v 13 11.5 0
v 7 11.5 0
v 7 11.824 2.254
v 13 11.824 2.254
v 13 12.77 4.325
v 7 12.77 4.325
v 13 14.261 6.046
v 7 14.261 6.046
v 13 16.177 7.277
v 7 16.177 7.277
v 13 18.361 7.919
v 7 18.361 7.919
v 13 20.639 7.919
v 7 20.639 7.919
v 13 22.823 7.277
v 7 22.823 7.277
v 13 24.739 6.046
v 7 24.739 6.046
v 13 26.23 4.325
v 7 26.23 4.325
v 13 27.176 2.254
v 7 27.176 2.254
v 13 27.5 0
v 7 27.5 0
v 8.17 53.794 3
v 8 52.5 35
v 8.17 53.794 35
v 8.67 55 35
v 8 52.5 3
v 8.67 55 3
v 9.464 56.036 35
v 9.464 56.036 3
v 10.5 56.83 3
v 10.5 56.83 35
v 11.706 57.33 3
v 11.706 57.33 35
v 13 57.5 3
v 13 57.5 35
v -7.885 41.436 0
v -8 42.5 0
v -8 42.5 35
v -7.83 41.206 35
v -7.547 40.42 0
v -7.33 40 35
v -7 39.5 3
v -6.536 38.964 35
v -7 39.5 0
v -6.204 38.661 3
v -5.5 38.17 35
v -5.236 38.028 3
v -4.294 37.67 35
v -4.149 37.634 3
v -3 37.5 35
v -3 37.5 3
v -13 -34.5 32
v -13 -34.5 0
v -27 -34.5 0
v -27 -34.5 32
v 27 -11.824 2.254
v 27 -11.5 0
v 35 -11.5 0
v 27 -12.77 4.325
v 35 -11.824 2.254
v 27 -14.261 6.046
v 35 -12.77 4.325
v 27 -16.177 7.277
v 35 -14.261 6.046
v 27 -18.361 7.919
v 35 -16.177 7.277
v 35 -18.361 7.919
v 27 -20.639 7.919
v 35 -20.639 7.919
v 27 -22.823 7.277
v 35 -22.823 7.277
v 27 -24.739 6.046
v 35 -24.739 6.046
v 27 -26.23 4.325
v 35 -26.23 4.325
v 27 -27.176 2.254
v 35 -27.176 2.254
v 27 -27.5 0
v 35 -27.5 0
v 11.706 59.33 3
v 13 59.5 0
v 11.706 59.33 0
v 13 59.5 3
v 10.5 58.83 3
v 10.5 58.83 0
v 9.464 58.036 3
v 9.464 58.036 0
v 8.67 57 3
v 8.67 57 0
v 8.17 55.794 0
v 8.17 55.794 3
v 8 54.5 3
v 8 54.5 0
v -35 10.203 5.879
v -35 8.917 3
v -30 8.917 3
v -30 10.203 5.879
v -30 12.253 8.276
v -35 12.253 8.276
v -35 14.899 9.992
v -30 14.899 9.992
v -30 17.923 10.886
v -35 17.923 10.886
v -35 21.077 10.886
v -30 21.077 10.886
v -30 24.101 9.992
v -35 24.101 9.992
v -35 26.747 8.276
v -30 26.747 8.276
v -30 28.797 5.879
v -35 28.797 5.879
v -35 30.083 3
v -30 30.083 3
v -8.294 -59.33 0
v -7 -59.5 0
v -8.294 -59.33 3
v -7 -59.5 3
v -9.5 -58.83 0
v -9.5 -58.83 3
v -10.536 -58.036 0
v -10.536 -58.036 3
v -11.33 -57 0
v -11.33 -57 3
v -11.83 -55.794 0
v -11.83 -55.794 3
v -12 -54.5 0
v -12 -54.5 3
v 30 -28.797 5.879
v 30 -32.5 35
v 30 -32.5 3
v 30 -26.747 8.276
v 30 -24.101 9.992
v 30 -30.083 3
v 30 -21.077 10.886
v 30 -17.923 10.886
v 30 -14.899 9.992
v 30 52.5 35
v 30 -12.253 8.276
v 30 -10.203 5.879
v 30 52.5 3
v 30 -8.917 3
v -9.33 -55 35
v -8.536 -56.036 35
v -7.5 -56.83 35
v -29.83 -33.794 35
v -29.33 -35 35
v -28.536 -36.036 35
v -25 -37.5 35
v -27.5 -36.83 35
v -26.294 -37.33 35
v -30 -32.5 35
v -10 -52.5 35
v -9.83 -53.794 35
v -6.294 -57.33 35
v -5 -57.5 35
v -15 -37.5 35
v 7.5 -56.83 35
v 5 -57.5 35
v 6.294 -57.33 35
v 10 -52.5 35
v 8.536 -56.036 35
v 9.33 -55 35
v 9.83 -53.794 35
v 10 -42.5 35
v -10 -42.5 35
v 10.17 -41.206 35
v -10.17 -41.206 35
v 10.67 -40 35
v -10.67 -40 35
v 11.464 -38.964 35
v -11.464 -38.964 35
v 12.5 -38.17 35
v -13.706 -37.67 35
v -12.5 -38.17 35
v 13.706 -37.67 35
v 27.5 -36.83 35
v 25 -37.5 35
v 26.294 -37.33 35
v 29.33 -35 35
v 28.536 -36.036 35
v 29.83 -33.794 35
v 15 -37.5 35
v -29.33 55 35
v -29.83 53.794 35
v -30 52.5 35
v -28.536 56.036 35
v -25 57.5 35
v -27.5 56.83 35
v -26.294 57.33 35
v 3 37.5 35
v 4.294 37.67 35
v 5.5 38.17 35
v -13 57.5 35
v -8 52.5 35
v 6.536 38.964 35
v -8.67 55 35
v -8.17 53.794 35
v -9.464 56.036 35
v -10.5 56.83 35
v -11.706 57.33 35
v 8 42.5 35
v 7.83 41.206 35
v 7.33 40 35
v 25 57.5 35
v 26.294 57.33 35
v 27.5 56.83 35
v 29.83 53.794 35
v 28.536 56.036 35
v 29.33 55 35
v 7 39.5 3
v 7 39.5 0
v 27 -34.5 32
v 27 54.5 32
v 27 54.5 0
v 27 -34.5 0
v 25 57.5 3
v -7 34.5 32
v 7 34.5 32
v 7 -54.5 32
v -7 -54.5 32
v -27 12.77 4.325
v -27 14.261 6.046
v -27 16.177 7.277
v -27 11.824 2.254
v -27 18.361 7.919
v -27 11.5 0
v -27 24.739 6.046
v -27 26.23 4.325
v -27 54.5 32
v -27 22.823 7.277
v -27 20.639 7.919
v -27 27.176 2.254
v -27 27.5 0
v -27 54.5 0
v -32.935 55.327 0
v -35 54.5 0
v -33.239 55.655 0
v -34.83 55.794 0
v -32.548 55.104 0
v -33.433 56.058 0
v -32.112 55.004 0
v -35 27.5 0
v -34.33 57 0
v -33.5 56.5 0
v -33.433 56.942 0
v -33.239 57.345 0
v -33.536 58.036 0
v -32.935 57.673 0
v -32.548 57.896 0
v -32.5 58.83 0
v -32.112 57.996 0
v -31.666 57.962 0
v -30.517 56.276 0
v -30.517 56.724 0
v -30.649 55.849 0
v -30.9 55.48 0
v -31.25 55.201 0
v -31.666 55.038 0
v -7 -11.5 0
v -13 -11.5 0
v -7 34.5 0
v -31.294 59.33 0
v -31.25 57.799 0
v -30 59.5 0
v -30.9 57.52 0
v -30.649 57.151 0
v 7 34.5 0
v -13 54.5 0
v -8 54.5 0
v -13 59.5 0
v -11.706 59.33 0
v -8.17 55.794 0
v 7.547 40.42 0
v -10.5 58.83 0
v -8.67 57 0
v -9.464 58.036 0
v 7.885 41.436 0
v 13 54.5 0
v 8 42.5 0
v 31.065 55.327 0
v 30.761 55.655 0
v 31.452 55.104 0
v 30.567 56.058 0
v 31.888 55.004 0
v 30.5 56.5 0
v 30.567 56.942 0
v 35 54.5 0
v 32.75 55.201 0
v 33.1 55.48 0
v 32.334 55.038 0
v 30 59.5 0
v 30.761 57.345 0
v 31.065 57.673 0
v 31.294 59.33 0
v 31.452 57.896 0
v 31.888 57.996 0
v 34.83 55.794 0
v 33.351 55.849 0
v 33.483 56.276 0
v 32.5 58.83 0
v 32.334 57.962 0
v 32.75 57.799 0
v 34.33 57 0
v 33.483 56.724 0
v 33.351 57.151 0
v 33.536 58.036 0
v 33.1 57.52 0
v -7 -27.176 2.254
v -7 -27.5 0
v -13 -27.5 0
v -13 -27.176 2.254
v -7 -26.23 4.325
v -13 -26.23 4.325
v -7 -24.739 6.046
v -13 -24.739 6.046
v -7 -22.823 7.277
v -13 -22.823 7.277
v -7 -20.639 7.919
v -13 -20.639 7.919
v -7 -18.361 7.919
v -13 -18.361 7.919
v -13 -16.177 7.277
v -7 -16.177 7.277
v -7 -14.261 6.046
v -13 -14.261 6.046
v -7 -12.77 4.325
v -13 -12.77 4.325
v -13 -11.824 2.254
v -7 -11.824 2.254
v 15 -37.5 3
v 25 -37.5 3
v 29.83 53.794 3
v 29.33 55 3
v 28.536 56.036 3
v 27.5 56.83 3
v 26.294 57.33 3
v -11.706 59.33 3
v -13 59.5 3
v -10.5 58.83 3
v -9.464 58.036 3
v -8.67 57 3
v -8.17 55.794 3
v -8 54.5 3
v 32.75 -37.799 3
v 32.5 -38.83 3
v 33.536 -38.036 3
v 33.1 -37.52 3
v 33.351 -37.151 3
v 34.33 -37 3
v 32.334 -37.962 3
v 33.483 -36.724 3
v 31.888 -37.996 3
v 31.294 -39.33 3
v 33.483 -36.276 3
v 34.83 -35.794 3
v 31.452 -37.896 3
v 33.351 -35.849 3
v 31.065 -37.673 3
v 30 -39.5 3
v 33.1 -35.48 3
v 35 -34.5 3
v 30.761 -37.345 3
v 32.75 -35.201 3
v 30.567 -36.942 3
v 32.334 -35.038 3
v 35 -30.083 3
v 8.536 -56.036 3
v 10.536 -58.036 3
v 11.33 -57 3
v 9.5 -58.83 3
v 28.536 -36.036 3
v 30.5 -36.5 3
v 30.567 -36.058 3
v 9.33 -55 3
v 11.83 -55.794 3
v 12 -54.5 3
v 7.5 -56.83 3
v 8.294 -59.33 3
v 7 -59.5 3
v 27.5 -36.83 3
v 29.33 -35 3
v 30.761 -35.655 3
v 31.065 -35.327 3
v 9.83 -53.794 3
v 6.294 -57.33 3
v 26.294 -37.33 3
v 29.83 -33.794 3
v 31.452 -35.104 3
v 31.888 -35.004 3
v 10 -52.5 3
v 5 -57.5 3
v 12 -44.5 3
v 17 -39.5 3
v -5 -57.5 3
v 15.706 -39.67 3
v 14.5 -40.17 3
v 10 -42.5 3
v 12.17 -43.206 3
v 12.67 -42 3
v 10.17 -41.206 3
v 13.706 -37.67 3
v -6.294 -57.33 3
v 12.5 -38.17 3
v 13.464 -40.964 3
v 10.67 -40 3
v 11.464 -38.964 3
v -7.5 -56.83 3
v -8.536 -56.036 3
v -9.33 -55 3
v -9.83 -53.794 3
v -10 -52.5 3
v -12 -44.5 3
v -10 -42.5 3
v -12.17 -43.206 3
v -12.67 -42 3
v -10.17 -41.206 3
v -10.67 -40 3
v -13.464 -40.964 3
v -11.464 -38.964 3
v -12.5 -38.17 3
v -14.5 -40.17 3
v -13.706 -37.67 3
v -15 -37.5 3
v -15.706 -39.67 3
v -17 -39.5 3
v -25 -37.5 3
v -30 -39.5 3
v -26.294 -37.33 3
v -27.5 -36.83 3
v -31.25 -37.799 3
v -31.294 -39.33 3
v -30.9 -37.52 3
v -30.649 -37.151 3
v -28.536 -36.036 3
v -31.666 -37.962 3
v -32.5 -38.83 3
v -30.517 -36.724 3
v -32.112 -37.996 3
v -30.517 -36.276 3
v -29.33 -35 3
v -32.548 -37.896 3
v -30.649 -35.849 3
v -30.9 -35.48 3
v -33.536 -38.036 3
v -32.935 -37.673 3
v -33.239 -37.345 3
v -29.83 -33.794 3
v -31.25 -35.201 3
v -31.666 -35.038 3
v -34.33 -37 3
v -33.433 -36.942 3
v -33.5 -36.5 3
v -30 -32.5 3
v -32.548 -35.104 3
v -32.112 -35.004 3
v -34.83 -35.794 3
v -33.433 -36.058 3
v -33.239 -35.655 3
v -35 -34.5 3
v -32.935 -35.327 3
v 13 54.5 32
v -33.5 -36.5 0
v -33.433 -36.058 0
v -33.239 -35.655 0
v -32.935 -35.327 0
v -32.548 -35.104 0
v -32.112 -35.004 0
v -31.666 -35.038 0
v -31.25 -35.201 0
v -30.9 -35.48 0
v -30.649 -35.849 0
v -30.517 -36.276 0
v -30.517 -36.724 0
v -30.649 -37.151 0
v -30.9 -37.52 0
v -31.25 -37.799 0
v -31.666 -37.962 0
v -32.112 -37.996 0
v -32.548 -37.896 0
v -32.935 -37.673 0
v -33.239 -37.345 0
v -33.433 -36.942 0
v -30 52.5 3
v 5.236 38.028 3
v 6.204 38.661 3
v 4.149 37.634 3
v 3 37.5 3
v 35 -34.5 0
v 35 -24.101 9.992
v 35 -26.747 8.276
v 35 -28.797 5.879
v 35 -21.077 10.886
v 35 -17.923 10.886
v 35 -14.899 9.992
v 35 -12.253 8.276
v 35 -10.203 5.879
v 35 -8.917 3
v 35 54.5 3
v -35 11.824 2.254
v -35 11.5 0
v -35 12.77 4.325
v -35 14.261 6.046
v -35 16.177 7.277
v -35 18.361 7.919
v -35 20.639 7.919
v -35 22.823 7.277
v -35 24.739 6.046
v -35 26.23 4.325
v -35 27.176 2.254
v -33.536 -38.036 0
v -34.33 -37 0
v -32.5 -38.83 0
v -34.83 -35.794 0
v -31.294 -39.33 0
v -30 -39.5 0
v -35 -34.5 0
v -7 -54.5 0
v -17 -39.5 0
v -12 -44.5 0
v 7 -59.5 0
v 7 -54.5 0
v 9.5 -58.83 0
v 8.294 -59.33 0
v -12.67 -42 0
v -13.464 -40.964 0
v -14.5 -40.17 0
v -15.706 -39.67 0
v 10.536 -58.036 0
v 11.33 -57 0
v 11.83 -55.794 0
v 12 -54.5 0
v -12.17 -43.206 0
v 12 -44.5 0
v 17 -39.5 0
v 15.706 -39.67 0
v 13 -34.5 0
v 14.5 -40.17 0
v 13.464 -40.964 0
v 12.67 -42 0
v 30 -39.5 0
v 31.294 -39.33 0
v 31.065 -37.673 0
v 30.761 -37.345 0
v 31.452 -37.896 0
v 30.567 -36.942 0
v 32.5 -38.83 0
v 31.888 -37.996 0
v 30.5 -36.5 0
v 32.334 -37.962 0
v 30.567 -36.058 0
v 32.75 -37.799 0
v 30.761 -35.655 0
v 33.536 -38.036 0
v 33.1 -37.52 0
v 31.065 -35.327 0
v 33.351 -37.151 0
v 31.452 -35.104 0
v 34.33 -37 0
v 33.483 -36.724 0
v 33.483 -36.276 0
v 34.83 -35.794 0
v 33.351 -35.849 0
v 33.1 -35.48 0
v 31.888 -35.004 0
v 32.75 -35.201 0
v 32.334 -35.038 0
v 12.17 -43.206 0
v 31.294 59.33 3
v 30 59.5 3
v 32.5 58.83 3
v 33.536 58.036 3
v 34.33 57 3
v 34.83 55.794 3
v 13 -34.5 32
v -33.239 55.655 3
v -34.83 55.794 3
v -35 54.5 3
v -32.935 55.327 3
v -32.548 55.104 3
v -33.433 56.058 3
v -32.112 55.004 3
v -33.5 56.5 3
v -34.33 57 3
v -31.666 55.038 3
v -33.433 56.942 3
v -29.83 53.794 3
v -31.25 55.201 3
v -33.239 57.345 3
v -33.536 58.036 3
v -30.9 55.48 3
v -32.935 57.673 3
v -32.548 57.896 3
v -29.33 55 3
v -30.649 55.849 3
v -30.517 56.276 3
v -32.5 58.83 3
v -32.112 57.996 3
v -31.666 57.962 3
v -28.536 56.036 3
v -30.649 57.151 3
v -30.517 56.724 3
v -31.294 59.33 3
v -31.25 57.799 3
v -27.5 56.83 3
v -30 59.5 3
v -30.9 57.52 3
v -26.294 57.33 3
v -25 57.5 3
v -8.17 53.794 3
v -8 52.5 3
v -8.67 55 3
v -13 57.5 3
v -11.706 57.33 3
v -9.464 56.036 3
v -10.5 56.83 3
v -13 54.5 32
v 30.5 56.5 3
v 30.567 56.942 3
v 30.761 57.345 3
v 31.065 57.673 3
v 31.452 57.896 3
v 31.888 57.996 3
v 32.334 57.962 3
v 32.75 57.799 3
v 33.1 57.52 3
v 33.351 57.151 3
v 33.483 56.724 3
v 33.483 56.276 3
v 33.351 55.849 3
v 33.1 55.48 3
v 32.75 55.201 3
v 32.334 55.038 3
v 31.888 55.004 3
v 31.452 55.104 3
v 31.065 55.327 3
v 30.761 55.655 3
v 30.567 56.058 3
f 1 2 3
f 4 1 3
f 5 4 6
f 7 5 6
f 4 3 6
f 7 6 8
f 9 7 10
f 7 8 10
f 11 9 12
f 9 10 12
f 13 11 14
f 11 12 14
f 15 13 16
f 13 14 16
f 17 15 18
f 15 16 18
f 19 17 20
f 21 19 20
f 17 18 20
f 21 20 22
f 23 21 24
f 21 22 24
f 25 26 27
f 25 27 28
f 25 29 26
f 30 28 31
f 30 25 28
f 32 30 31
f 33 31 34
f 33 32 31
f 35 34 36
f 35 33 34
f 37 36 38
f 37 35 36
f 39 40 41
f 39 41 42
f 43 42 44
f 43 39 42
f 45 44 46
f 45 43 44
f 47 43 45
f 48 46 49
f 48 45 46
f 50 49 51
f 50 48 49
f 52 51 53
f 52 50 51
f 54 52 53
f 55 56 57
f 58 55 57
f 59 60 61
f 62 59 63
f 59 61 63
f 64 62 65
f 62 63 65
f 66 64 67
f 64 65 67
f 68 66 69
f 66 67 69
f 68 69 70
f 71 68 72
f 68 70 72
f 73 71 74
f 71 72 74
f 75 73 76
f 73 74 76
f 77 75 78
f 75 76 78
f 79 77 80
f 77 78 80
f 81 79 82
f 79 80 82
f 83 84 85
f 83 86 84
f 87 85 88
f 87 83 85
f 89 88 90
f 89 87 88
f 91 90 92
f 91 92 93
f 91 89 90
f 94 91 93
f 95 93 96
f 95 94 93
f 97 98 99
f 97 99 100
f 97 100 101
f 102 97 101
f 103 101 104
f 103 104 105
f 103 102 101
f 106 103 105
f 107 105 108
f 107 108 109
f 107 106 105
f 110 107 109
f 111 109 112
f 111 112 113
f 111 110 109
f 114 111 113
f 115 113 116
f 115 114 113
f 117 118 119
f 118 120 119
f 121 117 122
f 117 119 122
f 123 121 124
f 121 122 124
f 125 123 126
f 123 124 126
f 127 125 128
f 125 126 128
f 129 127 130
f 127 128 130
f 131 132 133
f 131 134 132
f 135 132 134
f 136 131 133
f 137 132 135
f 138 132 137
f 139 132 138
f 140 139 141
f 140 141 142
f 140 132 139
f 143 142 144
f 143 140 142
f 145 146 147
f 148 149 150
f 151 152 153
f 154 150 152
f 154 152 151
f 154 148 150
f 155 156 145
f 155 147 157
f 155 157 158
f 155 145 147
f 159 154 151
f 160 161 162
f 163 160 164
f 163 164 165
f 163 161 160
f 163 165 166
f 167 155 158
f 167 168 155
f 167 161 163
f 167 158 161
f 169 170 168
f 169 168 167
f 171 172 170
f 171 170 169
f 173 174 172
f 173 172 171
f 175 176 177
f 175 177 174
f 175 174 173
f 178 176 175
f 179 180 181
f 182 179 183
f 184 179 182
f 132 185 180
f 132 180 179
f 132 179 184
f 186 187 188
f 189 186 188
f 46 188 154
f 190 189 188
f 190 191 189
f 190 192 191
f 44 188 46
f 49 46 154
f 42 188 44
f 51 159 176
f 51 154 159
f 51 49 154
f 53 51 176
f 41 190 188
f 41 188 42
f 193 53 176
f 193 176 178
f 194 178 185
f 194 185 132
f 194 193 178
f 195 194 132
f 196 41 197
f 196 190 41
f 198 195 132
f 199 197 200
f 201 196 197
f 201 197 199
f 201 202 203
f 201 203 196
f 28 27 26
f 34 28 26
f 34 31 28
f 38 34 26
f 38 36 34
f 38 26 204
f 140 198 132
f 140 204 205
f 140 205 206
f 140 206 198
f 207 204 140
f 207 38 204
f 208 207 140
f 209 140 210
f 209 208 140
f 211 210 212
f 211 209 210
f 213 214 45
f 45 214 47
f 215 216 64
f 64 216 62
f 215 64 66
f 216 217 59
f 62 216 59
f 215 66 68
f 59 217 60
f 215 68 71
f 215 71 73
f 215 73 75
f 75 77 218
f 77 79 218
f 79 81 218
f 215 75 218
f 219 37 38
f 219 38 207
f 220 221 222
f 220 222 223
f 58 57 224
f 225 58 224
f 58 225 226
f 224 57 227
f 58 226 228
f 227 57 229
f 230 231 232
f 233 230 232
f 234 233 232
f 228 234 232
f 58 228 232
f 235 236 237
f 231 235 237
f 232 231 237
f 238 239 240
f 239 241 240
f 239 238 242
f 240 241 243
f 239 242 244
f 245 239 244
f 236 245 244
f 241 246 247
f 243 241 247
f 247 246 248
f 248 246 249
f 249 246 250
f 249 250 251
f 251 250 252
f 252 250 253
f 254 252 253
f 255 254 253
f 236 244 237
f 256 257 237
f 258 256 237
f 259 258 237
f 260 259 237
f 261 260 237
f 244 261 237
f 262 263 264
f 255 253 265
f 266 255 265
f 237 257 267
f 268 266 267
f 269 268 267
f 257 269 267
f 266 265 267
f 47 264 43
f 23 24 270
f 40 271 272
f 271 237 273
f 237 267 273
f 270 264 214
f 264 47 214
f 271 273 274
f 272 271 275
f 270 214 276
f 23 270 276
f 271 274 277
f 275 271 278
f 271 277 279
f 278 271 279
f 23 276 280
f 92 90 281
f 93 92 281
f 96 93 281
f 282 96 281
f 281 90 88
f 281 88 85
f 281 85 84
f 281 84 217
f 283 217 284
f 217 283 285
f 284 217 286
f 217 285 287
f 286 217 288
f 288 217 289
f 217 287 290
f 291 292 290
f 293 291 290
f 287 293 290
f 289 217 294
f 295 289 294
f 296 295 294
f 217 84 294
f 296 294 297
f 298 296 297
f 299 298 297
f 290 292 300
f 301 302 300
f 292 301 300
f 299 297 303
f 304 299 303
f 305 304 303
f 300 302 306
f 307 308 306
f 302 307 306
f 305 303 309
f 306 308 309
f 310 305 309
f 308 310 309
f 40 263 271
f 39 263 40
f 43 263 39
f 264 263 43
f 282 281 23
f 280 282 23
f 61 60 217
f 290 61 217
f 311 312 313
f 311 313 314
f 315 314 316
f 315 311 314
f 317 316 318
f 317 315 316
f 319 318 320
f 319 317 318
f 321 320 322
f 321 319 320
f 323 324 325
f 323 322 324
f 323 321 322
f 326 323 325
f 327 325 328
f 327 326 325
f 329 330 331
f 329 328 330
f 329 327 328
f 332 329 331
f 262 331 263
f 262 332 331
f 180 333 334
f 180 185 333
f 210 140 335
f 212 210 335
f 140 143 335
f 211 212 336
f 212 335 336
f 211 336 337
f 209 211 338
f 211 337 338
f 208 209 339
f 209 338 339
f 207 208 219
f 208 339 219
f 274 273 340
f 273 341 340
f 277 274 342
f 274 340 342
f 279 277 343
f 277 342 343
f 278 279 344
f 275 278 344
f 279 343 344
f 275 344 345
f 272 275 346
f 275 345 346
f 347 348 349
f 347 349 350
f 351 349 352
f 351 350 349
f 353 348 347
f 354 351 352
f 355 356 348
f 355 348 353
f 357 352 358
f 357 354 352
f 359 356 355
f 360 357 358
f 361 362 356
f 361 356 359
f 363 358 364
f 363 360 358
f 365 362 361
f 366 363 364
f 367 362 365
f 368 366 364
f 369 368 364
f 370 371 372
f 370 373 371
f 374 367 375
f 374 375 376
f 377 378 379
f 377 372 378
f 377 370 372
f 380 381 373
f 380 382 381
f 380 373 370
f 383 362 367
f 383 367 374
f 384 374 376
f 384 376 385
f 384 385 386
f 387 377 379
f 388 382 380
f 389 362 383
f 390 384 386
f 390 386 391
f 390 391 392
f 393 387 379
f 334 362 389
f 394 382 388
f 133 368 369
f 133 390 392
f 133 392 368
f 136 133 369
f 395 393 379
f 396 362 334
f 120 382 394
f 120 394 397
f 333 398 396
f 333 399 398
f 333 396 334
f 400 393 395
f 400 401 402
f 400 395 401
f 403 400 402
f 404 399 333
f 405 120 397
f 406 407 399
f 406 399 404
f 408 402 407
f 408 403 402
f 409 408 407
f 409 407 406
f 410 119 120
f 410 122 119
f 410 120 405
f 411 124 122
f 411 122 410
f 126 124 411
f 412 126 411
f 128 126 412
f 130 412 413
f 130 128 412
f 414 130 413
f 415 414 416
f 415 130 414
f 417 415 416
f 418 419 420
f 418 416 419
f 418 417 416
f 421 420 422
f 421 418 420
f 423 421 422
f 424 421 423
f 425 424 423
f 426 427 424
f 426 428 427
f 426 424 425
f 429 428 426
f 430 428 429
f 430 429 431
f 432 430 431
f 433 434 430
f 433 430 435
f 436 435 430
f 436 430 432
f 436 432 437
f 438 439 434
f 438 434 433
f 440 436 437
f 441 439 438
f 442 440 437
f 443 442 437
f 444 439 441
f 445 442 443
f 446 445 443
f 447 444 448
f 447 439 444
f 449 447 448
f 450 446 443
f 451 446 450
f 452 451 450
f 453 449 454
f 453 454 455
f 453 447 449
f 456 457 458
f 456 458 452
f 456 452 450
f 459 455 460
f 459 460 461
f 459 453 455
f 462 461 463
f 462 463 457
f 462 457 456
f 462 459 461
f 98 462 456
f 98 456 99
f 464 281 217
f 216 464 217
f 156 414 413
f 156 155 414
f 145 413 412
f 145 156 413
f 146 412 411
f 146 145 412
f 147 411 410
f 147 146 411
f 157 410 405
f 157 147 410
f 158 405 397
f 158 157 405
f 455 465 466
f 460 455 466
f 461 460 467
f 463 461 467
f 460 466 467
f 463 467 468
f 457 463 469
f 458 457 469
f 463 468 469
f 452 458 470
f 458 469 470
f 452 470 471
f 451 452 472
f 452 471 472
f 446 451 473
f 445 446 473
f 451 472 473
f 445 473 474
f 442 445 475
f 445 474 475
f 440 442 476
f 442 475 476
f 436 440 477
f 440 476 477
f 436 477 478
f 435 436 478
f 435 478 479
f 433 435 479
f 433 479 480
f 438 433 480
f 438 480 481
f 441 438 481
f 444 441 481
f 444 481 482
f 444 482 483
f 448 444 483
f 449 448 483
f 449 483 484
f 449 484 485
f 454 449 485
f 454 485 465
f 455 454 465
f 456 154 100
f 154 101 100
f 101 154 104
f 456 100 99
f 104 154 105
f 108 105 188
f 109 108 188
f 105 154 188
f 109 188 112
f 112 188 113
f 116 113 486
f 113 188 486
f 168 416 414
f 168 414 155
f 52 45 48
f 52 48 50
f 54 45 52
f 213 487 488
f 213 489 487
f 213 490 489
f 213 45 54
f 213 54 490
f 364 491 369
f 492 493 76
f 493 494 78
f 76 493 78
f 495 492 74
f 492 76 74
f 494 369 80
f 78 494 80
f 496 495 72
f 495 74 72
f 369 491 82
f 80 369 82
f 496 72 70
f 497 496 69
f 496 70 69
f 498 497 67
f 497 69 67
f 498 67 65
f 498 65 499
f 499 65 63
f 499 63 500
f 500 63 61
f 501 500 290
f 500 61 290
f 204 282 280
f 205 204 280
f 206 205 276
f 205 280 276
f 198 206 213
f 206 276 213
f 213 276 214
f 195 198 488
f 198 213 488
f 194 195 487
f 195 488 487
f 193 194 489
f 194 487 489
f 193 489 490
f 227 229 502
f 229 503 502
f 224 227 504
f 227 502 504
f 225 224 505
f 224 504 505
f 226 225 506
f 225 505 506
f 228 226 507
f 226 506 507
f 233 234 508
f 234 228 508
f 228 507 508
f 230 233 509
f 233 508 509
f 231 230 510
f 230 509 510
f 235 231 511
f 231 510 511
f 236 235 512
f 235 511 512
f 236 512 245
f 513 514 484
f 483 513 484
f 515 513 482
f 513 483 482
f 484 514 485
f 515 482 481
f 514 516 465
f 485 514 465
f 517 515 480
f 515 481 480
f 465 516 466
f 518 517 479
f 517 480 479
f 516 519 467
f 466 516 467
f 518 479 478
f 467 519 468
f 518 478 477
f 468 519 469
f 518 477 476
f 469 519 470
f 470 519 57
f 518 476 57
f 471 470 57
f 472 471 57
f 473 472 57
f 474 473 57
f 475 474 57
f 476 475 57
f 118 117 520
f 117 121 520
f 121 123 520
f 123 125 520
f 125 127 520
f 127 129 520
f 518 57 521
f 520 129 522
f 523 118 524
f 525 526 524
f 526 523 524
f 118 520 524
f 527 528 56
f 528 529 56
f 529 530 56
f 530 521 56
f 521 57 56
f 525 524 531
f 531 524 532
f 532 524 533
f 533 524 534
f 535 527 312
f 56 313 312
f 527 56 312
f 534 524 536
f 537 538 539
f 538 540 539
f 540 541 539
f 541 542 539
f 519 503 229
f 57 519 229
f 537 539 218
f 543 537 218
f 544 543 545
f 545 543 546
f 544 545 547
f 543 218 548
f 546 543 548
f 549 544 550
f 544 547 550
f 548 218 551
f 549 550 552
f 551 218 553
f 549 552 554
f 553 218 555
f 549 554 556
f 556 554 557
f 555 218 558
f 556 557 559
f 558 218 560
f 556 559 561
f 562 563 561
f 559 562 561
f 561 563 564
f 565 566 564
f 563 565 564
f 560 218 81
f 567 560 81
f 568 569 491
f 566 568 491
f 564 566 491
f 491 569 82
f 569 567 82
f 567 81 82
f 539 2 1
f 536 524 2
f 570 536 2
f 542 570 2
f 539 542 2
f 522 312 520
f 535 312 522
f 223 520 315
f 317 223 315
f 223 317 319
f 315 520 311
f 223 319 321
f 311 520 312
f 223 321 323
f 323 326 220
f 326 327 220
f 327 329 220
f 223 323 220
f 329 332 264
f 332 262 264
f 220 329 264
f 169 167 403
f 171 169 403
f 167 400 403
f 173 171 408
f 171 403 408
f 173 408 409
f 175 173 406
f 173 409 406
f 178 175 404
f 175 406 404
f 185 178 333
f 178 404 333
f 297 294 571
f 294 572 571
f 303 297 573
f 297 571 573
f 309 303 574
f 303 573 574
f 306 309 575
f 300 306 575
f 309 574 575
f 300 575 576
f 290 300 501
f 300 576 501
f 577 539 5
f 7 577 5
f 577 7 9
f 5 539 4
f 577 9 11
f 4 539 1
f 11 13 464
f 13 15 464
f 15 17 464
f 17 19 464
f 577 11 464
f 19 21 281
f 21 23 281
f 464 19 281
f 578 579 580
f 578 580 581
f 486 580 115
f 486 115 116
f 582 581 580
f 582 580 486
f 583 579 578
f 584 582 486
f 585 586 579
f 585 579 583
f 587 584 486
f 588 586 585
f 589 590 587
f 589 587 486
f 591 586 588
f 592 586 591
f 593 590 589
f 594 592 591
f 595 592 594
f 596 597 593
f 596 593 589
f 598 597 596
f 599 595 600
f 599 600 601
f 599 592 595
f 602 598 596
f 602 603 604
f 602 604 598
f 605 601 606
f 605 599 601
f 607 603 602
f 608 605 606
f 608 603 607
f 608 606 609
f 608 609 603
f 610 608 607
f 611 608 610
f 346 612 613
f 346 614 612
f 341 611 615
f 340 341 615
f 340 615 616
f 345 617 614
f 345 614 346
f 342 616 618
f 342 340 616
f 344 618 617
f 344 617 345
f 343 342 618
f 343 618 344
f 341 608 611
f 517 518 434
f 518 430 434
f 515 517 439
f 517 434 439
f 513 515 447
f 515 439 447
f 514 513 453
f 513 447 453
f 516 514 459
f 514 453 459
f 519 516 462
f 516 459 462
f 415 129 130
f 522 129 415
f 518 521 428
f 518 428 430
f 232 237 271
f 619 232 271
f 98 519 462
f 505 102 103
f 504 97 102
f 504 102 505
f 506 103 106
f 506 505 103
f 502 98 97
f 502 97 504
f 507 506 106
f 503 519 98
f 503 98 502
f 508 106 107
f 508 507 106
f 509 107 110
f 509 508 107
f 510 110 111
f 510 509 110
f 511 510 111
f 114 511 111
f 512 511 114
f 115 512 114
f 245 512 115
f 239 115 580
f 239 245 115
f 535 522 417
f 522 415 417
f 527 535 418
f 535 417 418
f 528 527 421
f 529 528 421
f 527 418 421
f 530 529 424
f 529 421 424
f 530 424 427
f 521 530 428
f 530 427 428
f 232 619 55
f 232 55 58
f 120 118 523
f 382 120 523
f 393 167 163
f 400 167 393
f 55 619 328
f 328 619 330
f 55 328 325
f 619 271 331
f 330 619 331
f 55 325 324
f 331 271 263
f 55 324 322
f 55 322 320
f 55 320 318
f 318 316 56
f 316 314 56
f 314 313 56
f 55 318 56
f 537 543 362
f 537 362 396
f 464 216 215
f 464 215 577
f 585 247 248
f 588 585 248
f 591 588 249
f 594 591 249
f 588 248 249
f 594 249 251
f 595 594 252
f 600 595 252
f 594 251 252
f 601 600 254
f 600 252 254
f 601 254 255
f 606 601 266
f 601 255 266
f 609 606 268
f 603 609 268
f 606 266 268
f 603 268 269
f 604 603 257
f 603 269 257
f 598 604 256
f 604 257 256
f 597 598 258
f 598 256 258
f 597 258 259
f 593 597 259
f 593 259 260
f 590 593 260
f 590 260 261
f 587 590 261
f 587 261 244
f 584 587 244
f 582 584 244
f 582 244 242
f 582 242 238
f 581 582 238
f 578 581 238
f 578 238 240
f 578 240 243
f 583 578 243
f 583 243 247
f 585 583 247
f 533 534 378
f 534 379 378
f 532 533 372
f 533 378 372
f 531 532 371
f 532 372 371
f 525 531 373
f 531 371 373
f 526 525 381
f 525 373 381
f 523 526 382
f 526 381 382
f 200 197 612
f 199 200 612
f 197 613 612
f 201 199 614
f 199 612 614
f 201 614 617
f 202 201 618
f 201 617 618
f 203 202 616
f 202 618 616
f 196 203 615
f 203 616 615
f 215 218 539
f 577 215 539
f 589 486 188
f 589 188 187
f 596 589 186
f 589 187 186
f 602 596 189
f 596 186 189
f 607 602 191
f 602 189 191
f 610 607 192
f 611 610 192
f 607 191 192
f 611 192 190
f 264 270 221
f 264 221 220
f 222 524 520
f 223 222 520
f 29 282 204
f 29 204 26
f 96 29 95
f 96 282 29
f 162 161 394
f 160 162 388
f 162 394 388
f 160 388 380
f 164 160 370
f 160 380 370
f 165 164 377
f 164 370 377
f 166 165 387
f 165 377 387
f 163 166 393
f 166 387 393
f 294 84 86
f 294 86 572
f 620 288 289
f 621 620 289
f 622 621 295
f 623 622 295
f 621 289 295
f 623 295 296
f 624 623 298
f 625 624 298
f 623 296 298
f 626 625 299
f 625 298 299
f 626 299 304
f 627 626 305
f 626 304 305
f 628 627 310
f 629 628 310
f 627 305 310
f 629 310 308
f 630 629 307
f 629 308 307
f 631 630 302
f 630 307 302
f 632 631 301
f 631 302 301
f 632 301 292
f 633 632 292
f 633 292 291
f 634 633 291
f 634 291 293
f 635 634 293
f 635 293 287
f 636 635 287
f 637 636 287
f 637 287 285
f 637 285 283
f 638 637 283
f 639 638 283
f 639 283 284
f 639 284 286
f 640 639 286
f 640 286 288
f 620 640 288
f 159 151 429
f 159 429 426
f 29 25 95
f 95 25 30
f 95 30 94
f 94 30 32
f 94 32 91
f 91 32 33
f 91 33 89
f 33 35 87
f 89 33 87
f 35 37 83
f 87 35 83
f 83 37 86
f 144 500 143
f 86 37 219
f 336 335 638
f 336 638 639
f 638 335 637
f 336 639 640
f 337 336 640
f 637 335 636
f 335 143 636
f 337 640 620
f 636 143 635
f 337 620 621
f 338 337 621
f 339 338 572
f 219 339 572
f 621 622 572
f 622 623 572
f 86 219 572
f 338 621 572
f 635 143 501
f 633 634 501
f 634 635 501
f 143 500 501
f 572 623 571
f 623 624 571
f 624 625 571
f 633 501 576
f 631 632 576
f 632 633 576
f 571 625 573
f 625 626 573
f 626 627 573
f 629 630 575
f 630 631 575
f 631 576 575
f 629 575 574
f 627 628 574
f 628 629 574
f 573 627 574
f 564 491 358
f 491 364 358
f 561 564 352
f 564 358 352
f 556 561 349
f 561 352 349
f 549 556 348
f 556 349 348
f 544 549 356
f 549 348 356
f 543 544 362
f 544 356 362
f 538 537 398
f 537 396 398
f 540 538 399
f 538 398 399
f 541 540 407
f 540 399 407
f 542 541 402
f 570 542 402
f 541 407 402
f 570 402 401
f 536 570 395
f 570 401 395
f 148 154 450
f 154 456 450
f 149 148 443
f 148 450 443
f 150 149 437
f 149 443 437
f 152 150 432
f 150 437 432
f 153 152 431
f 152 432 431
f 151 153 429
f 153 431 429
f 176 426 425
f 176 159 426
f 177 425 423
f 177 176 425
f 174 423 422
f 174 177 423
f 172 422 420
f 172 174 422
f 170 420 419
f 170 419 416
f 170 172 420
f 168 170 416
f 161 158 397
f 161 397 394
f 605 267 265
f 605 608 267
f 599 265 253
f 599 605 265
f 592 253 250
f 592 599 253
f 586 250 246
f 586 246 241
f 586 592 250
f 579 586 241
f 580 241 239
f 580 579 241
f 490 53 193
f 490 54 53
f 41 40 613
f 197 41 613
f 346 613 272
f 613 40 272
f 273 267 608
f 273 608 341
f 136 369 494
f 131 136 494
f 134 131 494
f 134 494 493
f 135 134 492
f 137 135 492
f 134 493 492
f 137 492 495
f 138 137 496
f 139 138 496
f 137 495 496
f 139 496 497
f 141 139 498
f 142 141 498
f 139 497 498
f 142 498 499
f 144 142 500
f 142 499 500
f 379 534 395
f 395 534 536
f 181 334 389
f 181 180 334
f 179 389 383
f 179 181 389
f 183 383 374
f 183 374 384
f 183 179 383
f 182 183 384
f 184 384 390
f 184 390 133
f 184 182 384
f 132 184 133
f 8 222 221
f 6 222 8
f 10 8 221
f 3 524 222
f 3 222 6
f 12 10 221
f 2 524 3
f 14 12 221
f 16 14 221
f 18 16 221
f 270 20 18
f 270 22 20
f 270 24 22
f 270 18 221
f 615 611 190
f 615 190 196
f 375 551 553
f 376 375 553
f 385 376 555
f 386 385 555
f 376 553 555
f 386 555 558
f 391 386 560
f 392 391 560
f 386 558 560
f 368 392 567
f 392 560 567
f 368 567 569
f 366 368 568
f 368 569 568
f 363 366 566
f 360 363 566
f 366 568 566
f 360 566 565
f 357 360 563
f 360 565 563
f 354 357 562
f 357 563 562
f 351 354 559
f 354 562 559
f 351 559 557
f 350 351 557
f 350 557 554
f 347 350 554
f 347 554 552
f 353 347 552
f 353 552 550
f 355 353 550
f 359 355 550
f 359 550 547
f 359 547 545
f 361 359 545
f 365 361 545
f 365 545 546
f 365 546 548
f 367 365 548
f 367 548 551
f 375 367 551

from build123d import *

# Parameters (mm, degrees)
SKETCH1_W           = 70
SKETCH1_H           = 119
BOSS_EXTRUDE1_DEPTH = 35
SKETCH2_R           = 8
CUT_EXTRUDE1_DEPTH  = 8
SKETCH3_R           = 8
CUT_EXTRUDE2_DEPTH  = 8
SKETCH4_W           = 14
SKETCH4_H           = 89
CUT_EXTRUDE3_DEPTH  = 32
CUT_EXTRUDE4_REACH  = 82.804
CUT_EXTRUDE5_REACH  = 82.804
SKETCH7_W           = 23
SKETCH7_H           = 20
SKETCH7_W_2         = 16
CUT_EXTRUDE7_DEPTH  = 78.396705356
CUT_EXTRUDE8_DEPTH  = 5
SKETCH12_W          = 18
SKETCH12_H          = 32
CUT_EXTRUDE9_DEPTH  = 2
SKETCH13_W          = 24
SKETCH13_H          = 32
CUT_EXTRUDE10_DEPTH = 2
SKETCH14_W          = 23
SKETCH14_H          = 32
CUT_EXTRUDE11_DEPTH = 2
SKETCH15_W          = 32
SKETCH15_H          = 20
CUT_EXTRUDE12_DEPTH = 2
SKETCH16_W          = 32
SKETCH16_H          = 20
CUT_EXTRUDE13_DEPTH = 2
SKETCH17_W          = 65
SKETCH17_H          = 32
CUT_EXTRUDE15_DEPTH = 2
SKETCH18_W          = 16
SKETCH18_H          = 32
CUT_EXTRUDE16_DEPTH = 2
CUT_EXTRUDE17_DEPTH = 5
SKETCH21_R          = 1.5
CUT_EXTRUDE18_DEPTH = 10
FILLET1_R           = 5
FILLET2_R           = 5


with BuildPart() as part:
    # Sketch1 → Boss-Extrude1 (new body)
    with BuildSketch(Plane.XY):
        Rectangle(SKETCH1_W, SKETCH1_H)
    extrude(amount=BOSS_EXTRUDE1_DEPTH)

    # Sketch2 → Cut-Extrude1 (cut)
    with BuildSketch(Plane(origin=(35, 0, 0), x_dir=(0, 0, -1), z_dir=(1, 0, 0))):
        with Locations((0, -19.5)):
            Circle(SKETCH2_R)
    extrude(amount=-CUT_EXTRUDE1_DEPTH, mode=Mode.SUBTRACT)

    # Sketch3 → Cut-Extrude2 (cut)
    with BuildSketch(Plane.ZY.offset(35)):
        with Locations((0, 19.5)):
            Circle(SKETCH3_R)
    extrude(amount=-CUT_EXTRUDE2_DEPTH, mode=Mode.SUBTRACT)

    # Sketch4 → Cut-Extrude3 (cut)
    with BuildSketch(Plane(origin=(0, 0, 0), x_dir=(-1, 0, 0), z_dir=(0, 0, -1))):
        Polygon((-13, -34.5), (-13, 54.5), (-27, 54.5), (-27, -11.5), (-27, -27.5), (-27, -34.5), align=None)
        with Locations((0, -10)):
            Rectangle(SKETCH4_W, SKETCH4_H)
        Polygon((27, 54.5), (13, 54.5), (13, -34.5), (27, -34.5), (27, 11.5), (27, 27.5), align=None)
    extrude(amount=-CUT_EXTRUDE3_DEPTH, mode=Mode.SUBTRACT)

    # Sketch5 → Cut-Extrude4 (cut, up to next)
    with BuildSketch(Plane.ZY.offset(-7), mode=Mode.PRIVATE) as cut_extrude4_sk1:
        with BuildLine():
            Line((0, 27.5), (0, 11.5))
            ThreePointArc((0, 11.5), (8, 19.5), (0, 27.5))
        make_face()
    cut_extrude4_tool1 = extrude(cut_extrude4_sk1.sketch, amount=-CUT_EXTRUDE4_REACH, mode=Mode.PRIVATE) & part.part
    add(cut_extrude4_tool1.solids().sort_by_distance((7, 19.5, 3.395305))[0], mode=Mode.SUBTRACT)

    # Sketch6 → Cut-Extrude5 (cut, up to next)
    with BuildSketch(Plane(origin=(-7, 0, 0), x_dir=(0, 0, -1), z_dir=(1, 0, 0)), mode=Mode.PRIVATE) as cut_extrude5_sk1:
        with BuildLine():
            Line((0, -11.5), (0, -27.5))
            ThreePointArc((0, -27.5), (-8, -19.5), (0, -11.5))
        make_face()
    cut_extrude5_tool1 = extrude(cut_extrude5_sk1.sketch, amount=-CUT_EXTRUDE5_REACH, mode=Mode.PRIVATE) & part.part
    add(cut_extrude5_tool1.solids().sort_by_distance((-7, -19.5, 3.395305))[0], mode=Mode.SUBTRACT)

    # Sketch7 → Cut-Extrude7 (cut, through all)
    with BuildSketch(Plane(origin=(0, 0, 0), x_dir=(-1, 0, 0), z_dir=(0, 0, -1))):
        with Locations((23.5, -49.5)):
            Rectangle(SKETCH7_W, SKETCH7_H)
        with Locations((0, 49.5)):
            Rectangle(SKETCH7_W_2, SKETCH7_H)
        with Locations((-23.5, -49.5)):
            Rectangle(SKETCH7_W, SKETCH7_H)
    extrude(amount=-CUT_EXTRUDE7_DEPTH, mode=Mode.SUBTRACT)

    # Sketch11 → Cut-Extrude8 (cut)
    with BuildSketch(Plane(origin=(35, 0, 0), x_dir=(0, 0, -1), z_dir=(1, 0, 0))):
        with BuildLine():
            Line((-3, 59.5), (-35, 59.5))
            Line((-35, 59.5), (-35, -39.5))
            Line((-35, -39.5), (-3, -39.5))
            Line((-3, -39.5), (-3, -30.083005244))
            ThreePointArc((-3, -30.083005244), (-11, -19.5), (-3, -8.916994756))
            Line((-3, -8.916994756), (-3, 59.5))
        make_face()
    extrude(amount=-CUT_EXTRUDE8_DEPTH, mode=Mode.SUBTRACT)

    # Sketch12 → Cut-Extrude9 (cut)
    with BuildSketch(Plane.XZ.offset(39.5)):
        with Locations((21, 19)):
            Rectangle(SKETCH12_W, SKETCH12_H)
    extrude(amount=-CUT_EXTRUDE9_DEPTH, mode=Mode.SUBTRACT)

    # Sketch13 → Cut-Extrude10 (cut)
    with BuildSketch(Plane.XZ.offset(59.5)):
        with Locations((0, 19)):
            Rectangle(SKETCH13_W, SKETCH13_H)
    extrude(amount=-CUT_EXTRUDE10_DEPTH, mode=Mode.SUBTRACT)

    # Sketch14 → Cut-Extrude11 (cut)
    with BuildSketch(Plane.XZ.offset(39.5)):
        with Locations((-23.5, 19)):
            Rectangle(SKETCH14_W, SKETCH14_H)
    extrude(amount=-CUT_EXTRUDE11_DEPTH, mode=Mode.SUBTRACT)

    # Sketch15 → Cut-Extrude12 (cut)
    with BuildSketch(Plane.ZY.offset(12)):
        with Locations((19, -47.5)):
            Rectangle(SKETCH15_W, SKETCH15_H)
    extrude(amount=-CUT_EXTRUDE12_DEPTH, mode=Mode.SUBTRACT)

    # Sketch16 → Cut-Extrude13 (cut)
    with BuildSketch(Plane(origin=(12, 0, 0), x_dir=(0, 0, -1), z_dir=(1, 0, 0))):
        with Locations((-19, -47.5)):
            Rectangle(SKETCH16_W, SKETCH16_H)
    extrude(amount=-CUT_EXTRUDE13_DEPTH, mode=Mode.SUBTRACT)

    # Sketch17 → Cut-Extrude15 (cut)
    with BuildSketch(Plane(origin=(0, 59.5, 0), x_dir=(1, 0, 0), z_dir=(0, 1, 0))):
        with Locations((-2.5, -19)):
            Rectangle(SKETCH17_W, SKETCH17_H)
    extrude(amount=-CUT_EXTRUDE15_DEPTH, mode=Mode.SUBTRACT)

    # Sketch18 → Cut-Extrude16 (cut)
    with BuildSketch(Plane(origin=(0, 39.5, 0), x_dir=(1, 0, 0), z_dir=(0, 1, 0))):
        with Locations((0, -19)):
            Rectangle(SKETCH18_W, SKETCH18_H)
    extrude(amount=-CUT_EXTRUDE16_DEPTH, mode=Mode.SUBTRACT)

    # Sketch19 → Cut-Extrude17 (cut)
    with BuildSketch(Plane.ZY.offset(35)):
        with BuildLine():
            Line((3, 57.5), (35, 57.5))
            Line((35, 57.5), (35, -37.5))
            Line((35, -37.5), (3, -37.5))
            Line((3, -37.5), (3, 8.916994756))
            ThreePointArc((3, 8.916994756), (11, 19.5), (3, 30.083005244))
            Line((3, 30.083005244), (3, 57.5))
        make_face()
    extrude(amount=-CUT_EXTRUDE17_DEPTH, mode=Mode.SUBTRACT)

    # Sketch21 → Cut-Extrude18 (cut)
    with BuildSketch(Plane(origin=(0, 0, 0), x_dir=(-1, 0, 0), z_dir=(0, 0, -1))):
        with Locations((-32, 56.5)):
            Circle(SKETCH21_R)
        with Locations((32, 56.5)):
            Circle(SKETCH21_R)
        with Locations((-32, -36.5)):
            Circle(SKETCH21_R)
        with Locations((32, -36.5)):
            Circle(SKETCH21_R)
    extrude(amount=-CUT_EXTRUDE18_DEPTH, mode=Mode.SUBTRACT)

    # Fillet1
    fillet1_edges = [part.edges().sort_by_distance(p)[0] for p in [
        (-30, 57.5, 19),
        (-8, 57.5, 19),
        (-8, 37.5, 19),
        (8, 37.5, 19),
        (8, 57.5, 19),
        (30, 57.5, 19),
        (30, -37.5, 19),
        (10, -37.5, 19),
        (10, -57.5, 19),
        (-10, -37.5, 19),
        (-30, -37.5, 19),
        (-10, -57.5, 19),
    ]]
    fillet(fillet1_edges, radius=FILLET1_R)

    # Fillet2
    fillet2_edges = [part.edges().sort_by_distance(p)[0] for p in [
        (35, -39.5, 1.5),
        (35, 59.5, 1.5),
        (12, -39.5, 1.5),
        (12, -59.5, 1.5),
        (-12, -59.5, 1.5),
        (-12, -39.5, 1.5),
        (-35, -39.5, 1.5),
        (-8, 59.5, 1.5),
        (8, 59.5, 1.5),
        (-35, 59.5, 1.5),
    ]]
    fillet(fillet2_edges, radius=FILLET2_R)


solid = part.part
